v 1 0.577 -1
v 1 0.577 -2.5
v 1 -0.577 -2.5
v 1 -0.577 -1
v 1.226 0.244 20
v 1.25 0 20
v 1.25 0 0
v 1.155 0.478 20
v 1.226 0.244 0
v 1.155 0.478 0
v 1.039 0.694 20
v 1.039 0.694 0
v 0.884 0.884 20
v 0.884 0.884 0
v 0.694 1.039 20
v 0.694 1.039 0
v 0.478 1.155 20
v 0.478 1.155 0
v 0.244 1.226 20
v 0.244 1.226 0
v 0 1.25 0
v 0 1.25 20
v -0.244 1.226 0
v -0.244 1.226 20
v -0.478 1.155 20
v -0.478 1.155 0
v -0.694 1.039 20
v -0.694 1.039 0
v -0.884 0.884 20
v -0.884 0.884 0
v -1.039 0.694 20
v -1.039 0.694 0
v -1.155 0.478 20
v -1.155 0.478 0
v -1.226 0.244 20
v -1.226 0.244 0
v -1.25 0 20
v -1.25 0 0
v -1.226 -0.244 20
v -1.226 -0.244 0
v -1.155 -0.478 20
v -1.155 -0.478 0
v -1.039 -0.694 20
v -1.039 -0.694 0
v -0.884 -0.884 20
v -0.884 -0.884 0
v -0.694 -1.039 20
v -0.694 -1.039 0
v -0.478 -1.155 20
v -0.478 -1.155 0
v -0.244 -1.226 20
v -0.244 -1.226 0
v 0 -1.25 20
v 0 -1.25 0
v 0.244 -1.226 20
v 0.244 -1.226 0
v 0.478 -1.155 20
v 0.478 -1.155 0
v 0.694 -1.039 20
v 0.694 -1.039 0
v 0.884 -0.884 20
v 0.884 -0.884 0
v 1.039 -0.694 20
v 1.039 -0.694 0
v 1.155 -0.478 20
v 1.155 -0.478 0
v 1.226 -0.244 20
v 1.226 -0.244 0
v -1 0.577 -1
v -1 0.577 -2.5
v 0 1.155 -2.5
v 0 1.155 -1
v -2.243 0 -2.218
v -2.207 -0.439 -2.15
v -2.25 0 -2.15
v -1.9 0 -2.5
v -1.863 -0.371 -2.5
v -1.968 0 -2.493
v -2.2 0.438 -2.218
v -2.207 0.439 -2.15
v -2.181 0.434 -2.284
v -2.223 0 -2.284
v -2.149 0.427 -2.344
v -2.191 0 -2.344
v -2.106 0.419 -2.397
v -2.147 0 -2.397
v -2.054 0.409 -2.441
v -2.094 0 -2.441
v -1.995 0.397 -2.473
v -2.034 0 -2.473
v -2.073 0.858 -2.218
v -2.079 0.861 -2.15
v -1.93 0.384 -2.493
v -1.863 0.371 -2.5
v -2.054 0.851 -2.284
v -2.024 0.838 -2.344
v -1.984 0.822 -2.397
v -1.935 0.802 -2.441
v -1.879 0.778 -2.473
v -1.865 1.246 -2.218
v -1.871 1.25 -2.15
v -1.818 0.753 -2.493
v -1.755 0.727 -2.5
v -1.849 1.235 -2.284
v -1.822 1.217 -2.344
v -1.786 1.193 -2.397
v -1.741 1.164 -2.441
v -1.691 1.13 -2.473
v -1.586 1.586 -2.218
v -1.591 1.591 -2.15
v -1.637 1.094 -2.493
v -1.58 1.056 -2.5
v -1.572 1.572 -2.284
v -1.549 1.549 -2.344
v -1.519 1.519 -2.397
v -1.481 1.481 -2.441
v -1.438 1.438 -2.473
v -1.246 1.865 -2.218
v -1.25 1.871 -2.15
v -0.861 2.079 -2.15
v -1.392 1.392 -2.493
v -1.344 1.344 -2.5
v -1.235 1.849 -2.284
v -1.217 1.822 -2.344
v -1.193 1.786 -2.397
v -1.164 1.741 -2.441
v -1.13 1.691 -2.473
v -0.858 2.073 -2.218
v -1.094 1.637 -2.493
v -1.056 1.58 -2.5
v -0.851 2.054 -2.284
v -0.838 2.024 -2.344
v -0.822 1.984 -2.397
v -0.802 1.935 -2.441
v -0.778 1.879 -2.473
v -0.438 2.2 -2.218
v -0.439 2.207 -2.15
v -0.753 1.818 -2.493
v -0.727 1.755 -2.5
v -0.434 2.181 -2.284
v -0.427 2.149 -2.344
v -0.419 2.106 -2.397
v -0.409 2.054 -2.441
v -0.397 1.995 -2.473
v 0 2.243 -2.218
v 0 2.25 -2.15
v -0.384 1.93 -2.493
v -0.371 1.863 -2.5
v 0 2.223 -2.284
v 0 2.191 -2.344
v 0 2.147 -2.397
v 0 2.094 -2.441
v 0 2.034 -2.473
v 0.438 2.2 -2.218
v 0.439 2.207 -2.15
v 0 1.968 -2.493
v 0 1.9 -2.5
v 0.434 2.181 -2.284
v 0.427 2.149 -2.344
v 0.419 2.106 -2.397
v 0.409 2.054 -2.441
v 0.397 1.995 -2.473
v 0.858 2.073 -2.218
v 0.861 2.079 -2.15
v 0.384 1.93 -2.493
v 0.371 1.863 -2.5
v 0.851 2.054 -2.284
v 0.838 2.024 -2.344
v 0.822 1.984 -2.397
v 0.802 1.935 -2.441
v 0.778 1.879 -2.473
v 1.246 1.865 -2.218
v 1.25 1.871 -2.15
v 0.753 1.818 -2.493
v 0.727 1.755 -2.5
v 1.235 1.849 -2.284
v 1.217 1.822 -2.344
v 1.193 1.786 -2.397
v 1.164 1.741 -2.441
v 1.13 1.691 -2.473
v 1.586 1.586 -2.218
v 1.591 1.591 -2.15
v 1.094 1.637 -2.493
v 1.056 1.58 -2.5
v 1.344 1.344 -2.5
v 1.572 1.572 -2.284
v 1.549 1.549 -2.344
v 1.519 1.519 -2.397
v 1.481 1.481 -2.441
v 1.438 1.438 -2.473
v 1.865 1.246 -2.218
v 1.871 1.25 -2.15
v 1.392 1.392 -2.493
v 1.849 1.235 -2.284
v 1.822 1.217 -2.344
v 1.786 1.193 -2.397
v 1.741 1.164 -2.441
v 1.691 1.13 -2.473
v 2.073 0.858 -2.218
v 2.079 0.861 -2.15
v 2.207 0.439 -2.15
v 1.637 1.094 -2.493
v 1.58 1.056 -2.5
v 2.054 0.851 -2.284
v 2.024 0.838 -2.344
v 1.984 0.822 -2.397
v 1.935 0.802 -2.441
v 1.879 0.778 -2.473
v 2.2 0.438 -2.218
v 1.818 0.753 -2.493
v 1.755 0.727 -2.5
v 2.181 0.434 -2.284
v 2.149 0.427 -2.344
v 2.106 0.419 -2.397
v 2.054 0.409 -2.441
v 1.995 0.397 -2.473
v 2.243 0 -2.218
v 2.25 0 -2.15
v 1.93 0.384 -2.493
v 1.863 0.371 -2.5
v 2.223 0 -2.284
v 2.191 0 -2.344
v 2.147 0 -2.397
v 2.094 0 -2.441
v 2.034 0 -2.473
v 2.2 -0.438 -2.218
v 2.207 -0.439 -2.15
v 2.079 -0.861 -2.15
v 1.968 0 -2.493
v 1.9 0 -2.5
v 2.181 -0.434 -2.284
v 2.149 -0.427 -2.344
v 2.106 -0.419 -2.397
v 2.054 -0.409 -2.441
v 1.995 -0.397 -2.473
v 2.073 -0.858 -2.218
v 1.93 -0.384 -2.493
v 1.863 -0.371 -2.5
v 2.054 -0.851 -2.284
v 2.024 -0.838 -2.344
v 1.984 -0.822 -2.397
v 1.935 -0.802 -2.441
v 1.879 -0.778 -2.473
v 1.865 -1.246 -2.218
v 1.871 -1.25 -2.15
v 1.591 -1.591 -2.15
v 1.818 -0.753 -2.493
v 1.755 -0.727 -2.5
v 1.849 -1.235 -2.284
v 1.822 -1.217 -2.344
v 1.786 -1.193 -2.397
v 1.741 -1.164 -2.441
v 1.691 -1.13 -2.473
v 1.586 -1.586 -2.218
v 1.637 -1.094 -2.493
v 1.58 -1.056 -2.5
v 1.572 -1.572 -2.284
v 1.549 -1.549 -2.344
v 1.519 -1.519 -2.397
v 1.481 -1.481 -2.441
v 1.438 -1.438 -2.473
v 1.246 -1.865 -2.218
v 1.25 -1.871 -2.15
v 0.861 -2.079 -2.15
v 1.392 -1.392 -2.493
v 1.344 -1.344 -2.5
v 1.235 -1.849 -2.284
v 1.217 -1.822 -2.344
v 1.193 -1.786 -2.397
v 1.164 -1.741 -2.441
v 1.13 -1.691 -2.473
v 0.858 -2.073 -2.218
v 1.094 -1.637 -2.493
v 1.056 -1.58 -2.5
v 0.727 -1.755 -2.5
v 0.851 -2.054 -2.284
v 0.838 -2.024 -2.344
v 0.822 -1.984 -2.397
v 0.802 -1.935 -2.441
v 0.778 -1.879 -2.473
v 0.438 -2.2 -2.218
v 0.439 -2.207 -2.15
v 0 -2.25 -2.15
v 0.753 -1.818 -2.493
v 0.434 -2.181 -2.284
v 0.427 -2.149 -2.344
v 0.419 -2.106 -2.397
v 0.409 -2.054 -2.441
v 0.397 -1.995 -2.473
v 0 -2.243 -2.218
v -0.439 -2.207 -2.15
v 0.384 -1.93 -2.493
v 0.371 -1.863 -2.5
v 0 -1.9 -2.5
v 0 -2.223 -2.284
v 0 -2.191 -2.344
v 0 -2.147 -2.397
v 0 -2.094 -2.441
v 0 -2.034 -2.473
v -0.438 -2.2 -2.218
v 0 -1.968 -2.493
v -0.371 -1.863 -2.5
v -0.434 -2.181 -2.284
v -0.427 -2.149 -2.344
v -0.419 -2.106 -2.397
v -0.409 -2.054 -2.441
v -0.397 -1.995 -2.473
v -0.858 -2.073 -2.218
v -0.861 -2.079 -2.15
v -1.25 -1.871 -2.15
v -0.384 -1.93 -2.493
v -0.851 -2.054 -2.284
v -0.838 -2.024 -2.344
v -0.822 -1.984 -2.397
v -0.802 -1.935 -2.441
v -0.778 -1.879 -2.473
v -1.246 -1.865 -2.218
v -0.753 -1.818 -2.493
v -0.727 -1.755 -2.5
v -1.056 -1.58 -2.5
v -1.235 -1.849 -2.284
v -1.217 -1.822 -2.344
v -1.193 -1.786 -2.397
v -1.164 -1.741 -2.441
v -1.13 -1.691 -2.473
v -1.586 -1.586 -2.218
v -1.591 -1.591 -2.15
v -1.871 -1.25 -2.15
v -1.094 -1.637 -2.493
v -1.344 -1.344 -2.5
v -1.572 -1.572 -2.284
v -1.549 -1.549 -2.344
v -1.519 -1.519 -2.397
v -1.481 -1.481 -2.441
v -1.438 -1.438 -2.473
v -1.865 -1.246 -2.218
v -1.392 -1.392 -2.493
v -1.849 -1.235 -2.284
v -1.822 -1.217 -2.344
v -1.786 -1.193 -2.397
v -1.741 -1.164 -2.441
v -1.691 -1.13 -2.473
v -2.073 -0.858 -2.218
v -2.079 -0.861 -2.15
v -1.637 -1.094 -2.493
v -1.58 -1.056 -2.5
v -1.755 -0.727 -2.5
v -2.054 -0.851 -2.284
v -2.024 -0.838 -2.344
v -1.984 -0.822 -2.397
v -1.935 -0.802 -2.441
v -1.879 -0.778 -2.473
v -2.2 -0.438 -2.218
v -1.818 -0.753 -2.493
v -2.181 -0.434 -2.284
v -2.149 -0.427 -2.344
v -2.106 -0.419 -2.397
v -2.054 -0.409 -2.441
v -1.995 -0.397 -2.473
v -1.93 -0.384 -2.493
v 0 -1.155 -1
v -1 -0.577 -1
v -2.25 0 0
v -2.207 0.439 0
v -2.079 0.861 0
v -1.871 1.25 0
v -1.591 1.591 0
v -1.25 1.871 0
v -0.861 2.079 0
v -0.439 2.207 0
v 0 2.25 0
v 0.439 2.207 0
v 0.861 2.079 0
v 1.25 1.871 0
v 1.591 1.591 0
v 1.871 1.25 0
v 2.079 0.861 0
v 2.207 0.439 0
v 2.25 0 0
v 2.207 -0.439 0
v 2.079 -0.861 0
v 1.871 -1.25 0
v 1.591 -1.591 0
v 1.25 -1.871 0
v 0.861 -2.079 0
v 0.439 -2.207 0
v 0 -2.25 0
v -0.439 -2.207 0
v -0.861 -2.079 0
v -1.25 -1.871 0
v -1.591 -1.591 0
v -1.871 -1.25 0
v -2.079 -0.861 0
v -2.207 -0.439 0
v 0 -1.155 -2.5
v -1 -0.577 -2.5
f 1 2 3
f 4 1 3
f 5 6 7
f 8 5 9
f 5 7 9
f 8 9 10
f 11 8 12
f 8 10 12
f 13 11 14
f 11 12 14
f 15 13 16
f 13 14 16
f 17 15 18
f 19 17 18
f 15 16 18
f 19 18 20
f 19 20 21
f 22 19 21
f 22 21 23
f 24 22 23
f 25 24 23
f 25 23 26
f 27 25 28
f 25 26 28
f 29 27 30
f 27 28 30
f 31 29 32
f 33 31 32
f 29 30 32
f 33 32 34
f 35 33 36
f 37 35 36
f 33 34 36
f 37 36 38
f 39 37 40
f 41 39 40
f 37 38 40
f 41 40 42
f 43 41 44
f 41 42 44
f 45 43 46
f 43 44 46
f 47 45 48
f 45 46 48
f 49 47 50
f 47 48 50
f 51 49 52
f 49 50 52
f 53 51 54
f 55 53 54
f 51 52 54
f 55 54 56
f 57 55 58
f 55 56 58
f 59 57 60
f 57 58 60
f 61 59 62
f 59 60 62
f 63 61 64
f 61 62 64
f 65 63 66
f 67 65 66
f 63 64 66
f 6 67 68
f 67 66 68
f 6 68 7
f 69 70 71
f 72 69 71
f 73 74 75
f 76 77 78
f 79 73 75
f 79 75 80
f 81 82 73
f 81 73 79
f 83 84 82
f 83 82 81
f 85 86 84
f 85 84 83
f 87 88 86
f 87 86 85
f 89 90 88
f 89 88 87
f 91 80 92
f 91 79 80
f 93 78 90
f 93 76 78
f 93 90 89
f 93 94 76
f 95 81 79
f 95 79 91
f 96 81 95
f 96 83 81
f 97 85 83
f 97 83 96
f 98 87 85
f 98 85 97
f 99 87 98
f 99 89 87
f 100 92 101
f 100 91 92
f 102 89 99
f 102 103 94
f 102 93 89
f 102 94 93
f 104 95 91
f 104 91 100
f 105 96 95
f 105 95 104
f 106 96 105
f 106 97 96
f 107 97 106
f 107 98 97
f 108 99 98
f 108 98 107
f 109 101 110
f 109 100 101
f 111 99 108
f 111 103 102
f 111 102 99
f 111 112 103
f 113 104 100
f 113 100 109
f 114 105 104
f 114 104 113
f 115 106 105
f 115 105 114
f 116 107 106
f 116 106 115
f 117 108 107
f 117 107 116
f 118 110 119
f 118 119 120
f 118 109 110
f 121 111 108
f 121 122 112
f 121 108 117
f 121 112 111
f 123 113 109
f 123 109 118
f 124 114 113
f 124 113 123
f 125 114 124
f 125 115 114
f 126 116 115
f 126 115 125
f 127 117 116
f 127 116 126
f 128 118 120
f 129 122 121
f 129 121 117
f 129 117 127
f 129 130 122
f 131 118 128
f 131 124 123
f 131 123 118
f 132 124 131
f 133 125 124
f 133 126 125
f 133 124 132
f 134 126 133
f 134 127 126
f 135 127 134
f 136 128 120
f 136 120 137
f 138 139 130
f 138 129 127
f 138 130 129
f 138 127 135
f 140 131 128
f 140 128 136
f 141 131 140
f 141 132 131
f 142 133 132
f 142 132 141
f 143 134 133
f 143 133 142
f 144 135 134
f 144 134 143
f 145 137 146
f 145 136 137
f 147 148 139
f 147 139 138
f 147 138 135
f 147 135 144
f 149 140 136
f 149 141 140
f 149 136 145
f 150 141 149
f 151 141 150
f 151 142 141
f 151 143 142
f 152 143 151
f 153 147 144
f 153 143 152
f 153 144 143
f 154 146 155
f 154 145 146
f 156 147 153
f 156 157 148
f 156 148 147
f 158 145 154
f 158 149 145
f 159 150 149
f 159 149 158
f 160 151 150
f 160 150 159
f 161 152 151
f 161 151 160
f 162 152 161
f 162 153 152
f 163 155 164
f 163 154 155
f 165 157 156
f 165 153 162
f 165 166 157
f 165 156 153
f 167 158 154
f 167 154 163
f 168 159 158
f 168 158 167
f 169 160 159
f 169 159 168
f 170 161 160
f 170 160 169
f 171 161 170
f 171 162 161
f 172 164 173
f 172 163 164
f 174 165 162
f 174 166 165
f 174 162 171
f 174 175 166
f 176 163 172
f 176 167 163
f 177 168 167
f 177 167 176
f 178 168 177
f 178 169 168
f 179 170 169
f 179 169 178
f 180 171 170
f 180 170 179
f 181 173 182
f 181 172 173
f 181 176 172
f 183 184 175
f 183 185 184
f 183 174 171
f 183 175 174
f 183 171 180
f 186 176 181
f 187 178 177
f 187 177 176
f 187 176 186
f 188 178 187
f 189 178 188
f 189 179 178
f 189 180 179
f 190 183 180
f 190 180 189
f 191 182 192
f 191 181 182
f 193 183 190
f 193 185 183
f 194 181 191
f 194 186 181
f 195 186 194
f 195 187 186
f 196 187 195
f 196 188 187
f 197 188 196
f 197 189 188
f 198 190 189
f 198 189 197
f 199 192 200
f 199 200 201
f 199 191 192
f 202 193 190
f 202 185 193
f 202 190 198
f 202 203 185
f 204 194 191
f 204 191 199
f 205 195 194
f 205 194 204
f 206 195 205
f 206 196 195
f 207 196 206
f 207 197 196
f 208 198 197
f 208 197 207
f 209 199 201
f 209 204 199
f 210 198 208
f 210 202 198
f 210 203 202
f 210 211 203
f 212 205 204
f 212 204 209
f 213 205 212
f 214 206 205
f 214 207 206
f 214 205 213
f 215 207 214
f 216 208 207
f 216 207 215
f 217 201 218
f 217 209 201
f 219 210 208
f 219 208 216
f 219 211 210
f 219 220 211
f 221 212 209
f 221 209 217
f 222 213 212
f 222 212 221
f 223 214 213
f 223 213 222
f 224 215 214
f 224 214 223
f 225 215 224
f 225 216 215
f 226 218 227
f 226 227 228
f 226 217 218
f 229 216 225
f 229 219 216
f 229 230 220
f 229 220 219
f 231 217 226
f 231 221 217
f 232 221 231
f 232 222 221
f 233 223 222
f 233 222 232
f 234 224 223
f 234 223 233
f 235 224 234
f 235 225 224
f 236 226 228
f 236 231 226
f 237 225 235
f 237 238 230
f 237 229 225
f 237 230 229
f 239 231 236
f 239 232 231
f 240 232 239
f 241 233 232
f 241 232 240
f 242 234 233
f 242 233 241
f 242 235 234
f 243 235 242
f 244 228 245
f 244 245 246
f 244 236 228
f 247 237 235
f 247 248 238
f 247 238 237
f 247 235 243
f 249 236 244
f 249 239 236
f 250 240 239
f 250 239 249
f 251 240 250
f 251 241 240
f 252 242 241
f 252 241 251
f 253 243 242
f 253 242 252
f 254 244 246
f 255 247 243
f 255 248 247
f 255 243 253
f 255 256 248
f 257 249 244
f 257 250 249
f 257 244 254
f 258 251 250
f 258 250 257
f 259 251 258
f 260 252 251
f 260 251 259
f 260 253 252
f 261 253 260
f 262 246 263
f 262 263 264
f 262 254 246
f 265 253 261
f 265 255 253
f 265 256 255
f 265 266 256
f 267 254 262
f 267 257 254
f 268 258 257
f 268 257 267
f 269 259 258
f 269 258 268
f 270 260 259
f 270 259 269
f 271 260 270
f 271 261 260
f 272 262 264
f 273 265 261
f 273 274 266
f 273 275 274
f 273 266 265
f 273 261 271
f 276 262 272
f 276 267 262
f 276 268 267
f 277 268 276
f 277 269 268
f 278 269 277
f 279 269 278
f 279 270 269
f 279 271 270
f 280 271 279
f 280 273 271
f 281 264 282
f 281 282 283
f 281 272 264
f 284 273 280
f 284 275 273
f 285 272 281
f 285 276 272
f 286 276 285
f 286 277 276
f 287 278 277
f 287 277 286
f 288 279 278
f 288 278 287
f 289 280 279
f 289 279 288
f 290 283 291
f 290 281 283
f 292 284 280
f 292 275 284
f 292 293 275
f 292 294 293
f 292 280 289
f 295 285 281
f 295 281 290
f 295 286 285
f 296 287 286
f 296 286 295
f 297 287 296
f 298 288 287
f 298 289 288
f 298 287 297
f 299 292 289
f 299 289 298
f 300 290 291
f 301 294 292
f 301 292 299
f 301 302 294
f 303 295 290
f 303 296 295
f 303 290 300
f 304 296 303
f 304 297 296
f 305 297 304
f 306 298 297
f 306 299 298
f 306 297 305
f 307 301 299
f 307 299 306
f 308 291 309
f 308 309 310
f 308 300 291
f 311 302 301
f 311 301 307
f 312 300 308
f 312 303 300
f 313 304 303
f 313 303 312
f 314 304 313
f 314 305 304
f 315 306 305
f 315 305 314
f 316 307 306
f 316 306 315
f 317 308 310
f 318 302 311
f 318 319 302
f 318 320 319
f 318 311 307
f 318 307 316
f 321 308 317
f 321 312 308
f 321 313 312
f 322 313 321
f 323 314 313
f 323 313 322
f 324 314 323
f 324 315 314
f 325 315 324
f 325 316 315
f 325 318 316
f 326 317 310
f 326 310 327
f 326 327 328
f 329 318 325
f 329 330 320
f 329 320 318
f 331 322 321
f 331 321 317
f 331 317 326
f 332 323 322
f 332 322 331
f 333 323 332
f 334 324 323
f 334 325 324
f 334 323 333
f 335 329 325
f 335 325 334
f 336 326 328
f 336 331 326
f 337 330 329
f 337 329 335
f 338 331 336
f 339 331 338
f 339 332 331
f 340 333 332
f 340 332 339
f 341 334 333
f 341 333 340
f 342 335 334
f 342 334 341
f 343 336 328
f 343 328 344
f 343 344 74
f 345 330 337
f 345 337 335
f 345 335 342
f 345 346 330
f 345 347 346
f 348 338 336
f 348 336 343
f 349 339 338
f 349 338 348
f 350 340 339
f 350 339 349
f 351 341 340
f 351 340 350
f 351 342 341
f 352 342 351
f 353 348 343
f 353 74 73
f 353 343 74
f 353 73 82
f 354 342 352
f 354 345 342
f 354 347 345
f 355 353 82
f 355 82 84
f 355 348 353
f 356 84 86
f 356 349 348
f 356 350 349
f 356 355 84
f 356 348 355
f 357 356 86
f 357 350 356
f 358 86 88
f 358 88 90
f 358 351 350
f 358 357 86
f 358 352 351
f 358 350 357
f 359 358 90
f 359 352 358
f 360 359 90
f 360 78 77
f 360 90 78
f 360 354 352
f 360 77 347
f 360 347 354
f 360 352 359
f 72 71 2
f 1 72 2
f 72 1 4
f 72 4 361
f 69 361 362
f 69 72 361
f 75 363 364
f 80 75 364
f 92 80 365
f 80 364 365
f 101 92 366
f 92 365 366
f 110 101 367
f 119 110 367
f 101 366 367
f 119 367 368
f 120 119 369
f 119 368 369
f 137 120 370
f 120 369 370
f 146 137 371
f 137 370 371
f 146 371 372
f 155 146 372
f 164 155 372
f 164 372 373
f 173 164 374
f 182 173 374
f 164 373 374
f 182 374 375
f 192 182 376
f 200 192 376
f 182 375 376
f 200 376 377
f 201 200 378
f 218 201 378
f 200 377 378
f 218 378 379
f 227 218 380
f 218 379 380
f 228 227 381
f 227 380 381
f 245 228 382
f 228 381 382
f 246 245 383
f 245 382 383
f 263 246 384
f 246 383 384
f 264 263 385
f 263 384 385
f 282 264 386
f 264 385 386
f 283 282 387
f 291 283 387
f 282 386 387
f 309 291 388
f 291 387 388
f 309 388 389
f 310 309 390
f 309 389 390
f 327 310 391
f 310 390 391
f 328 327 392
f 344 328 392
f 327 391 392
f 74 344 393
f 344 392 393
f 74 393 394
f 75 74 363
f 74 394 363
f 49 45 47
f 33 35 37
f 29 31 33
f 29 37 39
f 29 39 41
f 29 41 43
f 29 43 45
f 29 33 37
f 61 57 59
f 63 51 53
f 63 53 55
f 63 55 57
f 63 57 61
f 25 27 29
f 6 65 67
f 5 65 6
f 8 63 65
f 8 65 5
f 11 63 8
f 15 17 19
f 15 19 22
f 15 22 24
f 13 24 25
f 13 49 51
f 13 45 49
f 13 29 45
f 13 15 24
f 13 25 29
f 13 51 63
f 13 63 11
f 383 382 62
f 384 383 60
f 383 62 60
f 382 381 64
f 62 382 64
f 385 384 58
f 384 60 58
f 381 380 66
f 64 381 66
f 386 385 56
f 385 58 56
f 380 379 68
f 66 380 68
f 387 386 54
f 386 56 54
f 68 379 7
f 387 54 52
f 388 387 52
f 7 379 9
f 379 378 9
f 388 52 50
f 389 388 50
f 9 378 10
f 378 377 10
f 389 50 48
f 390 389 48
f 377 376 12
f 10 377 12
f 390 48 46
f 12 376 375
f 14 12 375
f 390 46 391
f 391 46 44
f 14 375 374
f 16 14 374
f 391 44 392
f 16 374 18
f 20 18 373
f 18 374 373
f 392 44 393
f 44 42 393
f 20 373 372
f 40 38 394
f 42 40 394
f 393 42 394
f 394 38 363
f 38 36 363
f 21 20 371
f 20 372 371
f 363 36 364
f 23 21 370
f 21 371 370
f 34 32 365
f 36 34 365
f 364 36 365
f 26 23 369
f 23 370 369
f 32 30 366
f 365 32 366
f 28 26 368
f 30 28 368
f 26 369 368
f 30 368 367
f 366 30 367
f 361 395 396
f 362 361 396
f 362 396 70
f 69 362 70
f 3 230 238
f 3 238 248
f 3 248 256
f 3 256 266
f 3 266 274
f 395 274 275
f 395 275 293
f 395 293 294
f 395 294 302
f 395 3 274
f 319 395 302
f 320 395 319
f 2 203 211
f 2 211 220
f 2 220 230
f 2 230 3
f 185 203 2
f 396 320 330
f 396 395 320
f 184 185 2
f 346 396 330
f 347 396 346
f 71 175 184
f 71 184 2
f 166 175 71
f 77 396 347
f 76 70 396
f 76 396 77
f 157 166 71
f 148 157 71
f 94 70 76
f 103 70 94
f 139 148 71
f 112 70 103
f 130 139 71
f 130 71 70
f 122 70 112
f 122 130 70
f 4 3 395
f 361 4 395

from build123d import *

# Parameters (mm, degrees)
CROQUIS1_R              = 1.25
SALIENTE_EXTRUIR1_DEPTH = 20
CROQUIS2_R              = 2.25
SALIENTE_EXTRUIR2_DEPTH = 2.5
CORTAR_EXTRUIR1_DEPTH   = 1.5
REDONDEO1_R             = 0.35


with BuildPart() as part:
    # Croquis1 → Saliente-Extruir1 (new body)
    with BuildSketch(Plane.XY):
        Circle(CROQUIS1_R)
    extrude(amount=SALIENTE_EXTRUIR1_DEPTH)

    # Croquis2 → Saliente-Extruir2 (add)
    with BuildSketch(Plane(origin=(0, 0, 0), x_dir=(-1, 0, 0), z_dir=(0, 0, -1))):
        Circle(CROQUIS2_R)
    extrude(amount=SALIENTE_EXTRUIR2_DEPTH)

    # Croquis3 → Cortar-Extruir1 (cut)
    with BuildSketch(Plane(origin=(0, 0, -2.5), x_dir=(-1, 0, 0), z_dir=(0, 0, -1))):
        Polygon((0, -1.154700538), (1, -0.577350269), (1, 0.577350269), (0, 1.154700538), (-1, 0.577350269), (-1, -0.577350269), align=None)
    extrude(amount=-CORTAR_EXTRUIR1_DEPTH, mode=Mode.SUBTRACT)

    # Redondeo1
    redondeo1_edges = [part.edges().sort_by_distance(p)[0] for p in [
        (2.25, 0, -2.5),
    ]]
    fillet(redondeo1_edges, radius=REDONDEO1_R)


solid = part.part
